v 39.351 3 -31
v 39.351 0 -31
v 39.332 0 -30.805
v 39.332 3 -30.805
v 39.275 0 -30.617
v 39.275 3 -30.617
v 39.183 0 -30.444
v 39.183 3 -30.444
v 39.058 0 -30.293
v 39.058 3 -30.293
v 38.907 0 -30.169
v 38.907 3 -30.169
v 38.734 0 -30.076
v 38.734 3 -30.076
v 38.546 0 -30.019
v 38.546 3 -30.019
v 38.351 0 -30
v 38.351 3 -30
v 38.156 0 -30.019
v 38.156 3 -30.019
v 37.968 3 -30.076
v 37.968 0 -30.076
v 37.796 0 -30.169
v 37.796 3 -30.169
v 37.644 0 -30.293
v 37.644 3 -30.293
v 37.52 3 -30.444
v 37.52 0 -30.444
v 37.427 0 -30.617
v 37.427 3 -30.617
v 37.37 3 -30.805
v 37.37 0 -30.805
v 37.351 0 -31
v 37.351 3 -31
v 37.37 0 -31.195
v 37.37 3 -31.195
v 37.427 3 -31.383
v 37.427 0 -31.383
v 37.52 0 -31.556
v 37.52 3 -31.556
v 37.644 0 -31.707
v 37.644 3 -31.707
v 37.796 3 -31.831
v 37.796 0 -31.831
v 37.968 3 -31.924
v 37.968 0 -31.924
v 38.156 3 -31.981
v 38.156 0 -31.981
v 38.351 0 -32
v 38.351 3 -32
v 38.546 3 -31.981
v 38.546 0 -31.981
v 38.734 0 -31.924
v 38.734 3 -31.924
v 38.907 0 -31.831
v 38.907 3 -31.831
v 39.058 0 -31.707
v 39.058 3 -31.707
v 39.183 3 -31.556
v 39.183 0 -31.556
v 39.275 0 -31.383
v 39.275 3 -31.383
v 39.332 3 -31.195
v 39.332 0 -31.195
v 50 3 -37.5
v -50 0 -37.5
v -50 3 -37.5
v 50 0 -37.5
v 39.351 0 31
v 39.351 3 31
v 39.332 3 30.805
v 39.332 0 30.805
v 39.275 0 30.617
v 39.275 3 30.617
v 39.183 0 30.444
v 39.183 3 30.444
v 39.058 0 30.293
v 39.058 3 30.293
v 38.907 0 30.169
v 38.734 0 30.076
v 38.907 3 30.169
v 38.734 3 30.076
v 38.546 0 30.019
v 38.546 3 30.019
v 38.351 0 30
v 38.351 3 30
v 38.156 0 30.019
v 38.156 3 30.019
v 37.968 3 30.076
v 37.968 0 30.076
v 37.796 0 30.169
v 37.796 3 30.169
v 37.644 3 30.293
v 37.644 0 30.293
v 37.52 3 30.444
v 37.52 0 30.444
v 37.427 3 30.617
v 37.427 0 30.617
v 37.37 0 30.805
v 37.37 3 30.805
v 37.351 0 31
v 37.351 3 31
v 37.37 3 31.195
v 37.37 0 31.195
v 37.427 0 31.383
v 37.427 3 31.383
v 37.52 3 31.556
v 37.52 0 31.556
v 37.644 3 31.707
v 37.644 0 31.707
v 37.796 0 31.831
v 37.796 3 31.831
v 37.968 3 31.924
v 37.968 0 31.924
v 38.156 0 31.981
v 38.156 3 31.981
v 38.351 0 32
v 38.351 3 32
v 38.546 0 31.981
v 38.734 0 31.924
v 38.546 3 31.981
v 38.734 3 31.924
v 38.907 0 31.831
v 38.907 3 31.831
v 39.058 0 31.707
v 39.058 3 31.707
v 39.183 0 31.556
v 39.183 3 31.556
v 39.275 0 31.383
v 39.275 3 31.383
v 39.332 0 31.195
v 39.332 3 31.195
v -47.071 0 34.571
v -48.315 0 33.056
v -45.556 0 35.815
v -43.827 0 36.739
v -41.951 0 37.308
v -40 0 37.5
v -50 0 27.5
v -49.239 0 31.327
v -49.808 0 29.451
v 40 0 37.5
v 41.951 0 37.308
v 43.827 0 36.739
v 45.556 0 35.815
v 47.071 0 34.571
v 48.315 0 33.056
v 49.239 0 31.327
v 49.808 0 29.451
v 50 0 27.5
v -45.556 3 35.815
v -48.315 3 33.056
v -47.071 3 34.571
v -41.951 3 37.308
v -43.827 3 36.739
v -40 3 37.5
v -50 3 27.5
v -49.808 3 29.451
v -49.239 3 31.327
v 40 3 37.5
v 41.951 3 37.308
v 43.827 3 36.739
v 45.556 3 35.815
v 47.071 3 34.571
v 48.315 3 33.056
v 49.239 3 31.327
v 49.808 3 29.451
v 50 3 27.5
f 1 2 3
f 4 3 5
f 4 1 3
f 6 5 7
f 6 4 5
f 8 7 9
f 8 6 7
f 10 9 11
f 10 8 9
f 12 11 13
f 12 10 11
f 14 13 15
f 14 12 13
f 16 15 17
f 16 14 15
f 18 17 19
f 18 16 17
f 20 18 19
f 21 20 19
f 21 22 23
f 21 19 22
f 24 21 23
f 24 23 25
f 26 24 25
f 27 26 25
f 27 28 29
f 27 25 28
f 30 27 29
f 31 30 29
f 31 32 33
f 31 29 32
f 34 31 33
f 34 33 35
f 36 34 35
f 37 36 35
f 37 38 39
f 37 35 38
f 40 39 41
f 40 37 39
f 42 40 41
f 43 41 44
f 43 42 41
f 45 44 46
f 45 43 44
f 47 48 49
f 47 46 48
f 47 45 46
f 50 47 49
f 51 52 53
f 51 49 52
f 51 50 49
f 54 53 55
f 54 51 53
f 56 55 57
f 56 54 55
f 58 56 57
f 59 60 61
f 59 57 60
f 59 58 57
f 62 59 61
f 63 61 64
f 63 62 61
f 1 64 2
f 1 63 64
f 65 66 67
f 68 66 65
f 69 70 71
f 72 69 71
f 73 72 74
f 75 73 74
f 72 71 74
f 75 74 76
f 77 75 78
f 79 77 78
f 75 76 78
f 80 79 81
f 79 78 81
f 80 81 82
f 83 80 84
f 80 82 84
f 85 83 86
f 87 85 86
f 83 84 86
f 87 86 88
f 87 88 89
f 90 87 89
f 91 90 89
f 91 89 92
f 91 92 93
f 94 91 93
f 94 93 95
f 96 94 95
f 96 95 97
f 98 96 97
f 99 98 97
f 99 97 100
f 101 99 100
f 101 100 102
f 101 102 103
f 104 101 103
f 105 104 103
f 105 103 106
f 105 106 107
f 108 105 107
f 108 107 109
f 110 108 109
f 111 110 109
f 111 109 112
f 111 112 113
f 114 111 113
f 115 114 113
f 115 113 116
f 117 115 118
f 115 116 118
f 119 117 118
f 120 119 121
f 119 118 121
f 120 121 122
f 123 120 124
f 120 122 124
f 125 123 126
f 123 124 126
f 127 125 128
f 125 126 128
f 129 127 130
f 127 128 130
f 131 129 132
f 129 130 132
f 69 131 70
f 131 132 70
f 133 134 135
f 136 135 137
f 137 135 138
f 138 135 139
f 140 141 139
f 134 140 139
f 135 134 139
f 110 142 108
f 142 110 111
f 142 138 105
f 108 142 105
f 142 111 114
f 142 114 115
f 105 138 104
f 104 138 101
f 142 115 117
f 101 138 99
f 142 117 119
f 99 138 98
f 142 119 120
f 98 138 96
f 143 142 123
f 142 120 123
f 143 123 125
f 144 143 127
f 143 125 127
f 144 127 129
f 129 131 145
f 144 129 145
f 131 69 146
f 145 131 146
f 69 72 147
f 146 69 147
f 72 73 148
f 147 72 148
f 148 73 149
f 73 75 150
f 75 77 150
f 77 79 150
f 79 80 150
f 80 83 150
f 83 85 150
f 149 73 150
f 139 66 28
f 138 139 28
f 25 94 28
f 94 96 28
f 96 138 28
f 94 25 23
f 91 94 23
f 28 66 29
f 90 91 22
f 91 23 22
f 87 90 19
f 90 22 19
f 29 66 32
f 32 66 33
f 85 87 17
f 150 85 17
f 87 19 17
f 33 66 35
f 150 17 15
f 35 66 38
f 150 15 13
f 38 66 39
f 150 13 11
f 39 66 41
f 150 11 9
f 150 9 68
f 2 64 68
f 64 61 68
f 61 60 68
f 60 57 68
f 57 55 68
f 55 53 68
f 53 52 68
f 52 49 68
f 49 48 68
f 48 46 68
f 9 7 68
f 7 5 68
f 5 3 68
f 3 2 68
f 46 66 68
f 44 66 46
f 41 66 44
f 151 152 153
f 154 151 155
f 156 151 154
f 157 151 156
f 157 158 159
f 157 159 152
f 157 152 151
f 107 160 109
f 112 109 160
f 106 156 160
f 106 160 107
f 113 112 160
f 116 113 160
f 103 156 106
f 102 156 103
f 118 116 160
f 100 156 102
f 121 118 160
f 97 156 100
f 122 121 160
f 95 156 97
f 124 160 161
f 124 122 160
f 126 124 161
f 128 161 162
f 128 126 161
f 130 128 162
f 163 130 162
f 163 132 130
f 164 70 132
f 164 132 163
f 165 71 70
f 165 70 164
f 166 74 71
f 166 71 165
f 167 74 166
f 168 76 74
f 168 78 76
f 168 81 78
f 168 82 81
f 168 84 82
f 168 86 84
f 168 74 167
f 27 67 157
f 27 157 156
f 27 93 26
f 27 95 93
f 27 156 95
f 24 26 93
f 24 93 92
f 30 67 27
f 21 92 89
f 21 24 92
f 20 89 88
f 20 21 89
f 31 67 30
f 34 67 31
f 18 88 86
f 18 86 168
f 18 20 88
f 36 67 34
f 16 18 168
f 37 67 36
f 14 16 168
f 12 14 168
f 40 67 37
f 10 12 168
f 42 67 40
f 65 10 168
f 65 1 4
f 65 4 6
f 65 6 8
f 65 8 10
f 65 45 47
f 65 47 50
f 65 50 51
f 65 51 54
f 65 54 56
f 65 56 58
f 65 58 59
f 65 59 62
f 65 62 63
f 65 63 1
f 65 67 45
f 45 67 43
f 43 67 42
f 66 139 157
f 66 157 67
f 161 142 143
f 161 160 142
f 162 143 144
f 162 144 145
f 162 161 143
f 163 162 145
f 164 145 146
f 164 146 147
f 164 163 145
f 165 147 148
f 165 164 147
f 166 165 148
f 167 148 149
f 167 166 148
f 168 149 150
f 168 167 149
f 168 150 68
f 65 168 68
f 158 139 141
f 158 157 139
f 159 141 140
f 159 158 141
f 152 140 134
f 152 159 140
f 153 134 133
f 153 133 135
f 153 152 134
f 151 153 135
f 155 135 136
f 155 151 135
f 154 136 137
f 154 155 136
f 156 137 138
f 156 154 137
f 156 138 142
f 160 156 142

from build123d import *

# Parameters (mm, degrees)
SKETCH1_W           = 100
SKETCH1_H           = 75
BOSS_EXTRUDE1_DEPTH = 3
FILLET1_R           = 10
SKETCH2_R           = 1
CUT_EXTRUDE1_DEPTH  = 4


with BuildPart() as part:
    # Sketch1 → Boss-Extrude1 (new body)
    with BuildSketch(Plane(origin=(0, 0, 0), x_dir=(1, 0, 0), z_dir=(0, 1, 0))):
        Rectangle(SKETCH1_W, SKETCH1_H)
    extrude(amount=BOSS_EXTRUDE1_DEPTH)

    # Fillet1
    fillet1_edges = [part.edges().sort_by_distance(p)[0] for p in [
        (50, 1.5, 37.5),
        (-50, 1.5, 37.5),
    ]]
    fillet(fillet1_edges, radius=FILLET1_R)

    # Sketch2 → Cut-Extrude1 (cut, through all)
    with BuildSketch(Plane(origin=(0, 3, 0), x_dir=(1, 0, 0), z_dir=(0, 1, 0))):
        with Locations((38.351170888, -31)):
            Circle(SKETCH2_R)
    cut_extrude1 = extrude(amount=-CUT_EXTRUDE1_DEPTH, mode=Mode.SUBTRACT)

    # Mirror1: Cut-Extrude1 across plane
    add(cut_extrude1.mirror(Plane.XY), mode=Mode.SUBTRACT)


solid = part.part
